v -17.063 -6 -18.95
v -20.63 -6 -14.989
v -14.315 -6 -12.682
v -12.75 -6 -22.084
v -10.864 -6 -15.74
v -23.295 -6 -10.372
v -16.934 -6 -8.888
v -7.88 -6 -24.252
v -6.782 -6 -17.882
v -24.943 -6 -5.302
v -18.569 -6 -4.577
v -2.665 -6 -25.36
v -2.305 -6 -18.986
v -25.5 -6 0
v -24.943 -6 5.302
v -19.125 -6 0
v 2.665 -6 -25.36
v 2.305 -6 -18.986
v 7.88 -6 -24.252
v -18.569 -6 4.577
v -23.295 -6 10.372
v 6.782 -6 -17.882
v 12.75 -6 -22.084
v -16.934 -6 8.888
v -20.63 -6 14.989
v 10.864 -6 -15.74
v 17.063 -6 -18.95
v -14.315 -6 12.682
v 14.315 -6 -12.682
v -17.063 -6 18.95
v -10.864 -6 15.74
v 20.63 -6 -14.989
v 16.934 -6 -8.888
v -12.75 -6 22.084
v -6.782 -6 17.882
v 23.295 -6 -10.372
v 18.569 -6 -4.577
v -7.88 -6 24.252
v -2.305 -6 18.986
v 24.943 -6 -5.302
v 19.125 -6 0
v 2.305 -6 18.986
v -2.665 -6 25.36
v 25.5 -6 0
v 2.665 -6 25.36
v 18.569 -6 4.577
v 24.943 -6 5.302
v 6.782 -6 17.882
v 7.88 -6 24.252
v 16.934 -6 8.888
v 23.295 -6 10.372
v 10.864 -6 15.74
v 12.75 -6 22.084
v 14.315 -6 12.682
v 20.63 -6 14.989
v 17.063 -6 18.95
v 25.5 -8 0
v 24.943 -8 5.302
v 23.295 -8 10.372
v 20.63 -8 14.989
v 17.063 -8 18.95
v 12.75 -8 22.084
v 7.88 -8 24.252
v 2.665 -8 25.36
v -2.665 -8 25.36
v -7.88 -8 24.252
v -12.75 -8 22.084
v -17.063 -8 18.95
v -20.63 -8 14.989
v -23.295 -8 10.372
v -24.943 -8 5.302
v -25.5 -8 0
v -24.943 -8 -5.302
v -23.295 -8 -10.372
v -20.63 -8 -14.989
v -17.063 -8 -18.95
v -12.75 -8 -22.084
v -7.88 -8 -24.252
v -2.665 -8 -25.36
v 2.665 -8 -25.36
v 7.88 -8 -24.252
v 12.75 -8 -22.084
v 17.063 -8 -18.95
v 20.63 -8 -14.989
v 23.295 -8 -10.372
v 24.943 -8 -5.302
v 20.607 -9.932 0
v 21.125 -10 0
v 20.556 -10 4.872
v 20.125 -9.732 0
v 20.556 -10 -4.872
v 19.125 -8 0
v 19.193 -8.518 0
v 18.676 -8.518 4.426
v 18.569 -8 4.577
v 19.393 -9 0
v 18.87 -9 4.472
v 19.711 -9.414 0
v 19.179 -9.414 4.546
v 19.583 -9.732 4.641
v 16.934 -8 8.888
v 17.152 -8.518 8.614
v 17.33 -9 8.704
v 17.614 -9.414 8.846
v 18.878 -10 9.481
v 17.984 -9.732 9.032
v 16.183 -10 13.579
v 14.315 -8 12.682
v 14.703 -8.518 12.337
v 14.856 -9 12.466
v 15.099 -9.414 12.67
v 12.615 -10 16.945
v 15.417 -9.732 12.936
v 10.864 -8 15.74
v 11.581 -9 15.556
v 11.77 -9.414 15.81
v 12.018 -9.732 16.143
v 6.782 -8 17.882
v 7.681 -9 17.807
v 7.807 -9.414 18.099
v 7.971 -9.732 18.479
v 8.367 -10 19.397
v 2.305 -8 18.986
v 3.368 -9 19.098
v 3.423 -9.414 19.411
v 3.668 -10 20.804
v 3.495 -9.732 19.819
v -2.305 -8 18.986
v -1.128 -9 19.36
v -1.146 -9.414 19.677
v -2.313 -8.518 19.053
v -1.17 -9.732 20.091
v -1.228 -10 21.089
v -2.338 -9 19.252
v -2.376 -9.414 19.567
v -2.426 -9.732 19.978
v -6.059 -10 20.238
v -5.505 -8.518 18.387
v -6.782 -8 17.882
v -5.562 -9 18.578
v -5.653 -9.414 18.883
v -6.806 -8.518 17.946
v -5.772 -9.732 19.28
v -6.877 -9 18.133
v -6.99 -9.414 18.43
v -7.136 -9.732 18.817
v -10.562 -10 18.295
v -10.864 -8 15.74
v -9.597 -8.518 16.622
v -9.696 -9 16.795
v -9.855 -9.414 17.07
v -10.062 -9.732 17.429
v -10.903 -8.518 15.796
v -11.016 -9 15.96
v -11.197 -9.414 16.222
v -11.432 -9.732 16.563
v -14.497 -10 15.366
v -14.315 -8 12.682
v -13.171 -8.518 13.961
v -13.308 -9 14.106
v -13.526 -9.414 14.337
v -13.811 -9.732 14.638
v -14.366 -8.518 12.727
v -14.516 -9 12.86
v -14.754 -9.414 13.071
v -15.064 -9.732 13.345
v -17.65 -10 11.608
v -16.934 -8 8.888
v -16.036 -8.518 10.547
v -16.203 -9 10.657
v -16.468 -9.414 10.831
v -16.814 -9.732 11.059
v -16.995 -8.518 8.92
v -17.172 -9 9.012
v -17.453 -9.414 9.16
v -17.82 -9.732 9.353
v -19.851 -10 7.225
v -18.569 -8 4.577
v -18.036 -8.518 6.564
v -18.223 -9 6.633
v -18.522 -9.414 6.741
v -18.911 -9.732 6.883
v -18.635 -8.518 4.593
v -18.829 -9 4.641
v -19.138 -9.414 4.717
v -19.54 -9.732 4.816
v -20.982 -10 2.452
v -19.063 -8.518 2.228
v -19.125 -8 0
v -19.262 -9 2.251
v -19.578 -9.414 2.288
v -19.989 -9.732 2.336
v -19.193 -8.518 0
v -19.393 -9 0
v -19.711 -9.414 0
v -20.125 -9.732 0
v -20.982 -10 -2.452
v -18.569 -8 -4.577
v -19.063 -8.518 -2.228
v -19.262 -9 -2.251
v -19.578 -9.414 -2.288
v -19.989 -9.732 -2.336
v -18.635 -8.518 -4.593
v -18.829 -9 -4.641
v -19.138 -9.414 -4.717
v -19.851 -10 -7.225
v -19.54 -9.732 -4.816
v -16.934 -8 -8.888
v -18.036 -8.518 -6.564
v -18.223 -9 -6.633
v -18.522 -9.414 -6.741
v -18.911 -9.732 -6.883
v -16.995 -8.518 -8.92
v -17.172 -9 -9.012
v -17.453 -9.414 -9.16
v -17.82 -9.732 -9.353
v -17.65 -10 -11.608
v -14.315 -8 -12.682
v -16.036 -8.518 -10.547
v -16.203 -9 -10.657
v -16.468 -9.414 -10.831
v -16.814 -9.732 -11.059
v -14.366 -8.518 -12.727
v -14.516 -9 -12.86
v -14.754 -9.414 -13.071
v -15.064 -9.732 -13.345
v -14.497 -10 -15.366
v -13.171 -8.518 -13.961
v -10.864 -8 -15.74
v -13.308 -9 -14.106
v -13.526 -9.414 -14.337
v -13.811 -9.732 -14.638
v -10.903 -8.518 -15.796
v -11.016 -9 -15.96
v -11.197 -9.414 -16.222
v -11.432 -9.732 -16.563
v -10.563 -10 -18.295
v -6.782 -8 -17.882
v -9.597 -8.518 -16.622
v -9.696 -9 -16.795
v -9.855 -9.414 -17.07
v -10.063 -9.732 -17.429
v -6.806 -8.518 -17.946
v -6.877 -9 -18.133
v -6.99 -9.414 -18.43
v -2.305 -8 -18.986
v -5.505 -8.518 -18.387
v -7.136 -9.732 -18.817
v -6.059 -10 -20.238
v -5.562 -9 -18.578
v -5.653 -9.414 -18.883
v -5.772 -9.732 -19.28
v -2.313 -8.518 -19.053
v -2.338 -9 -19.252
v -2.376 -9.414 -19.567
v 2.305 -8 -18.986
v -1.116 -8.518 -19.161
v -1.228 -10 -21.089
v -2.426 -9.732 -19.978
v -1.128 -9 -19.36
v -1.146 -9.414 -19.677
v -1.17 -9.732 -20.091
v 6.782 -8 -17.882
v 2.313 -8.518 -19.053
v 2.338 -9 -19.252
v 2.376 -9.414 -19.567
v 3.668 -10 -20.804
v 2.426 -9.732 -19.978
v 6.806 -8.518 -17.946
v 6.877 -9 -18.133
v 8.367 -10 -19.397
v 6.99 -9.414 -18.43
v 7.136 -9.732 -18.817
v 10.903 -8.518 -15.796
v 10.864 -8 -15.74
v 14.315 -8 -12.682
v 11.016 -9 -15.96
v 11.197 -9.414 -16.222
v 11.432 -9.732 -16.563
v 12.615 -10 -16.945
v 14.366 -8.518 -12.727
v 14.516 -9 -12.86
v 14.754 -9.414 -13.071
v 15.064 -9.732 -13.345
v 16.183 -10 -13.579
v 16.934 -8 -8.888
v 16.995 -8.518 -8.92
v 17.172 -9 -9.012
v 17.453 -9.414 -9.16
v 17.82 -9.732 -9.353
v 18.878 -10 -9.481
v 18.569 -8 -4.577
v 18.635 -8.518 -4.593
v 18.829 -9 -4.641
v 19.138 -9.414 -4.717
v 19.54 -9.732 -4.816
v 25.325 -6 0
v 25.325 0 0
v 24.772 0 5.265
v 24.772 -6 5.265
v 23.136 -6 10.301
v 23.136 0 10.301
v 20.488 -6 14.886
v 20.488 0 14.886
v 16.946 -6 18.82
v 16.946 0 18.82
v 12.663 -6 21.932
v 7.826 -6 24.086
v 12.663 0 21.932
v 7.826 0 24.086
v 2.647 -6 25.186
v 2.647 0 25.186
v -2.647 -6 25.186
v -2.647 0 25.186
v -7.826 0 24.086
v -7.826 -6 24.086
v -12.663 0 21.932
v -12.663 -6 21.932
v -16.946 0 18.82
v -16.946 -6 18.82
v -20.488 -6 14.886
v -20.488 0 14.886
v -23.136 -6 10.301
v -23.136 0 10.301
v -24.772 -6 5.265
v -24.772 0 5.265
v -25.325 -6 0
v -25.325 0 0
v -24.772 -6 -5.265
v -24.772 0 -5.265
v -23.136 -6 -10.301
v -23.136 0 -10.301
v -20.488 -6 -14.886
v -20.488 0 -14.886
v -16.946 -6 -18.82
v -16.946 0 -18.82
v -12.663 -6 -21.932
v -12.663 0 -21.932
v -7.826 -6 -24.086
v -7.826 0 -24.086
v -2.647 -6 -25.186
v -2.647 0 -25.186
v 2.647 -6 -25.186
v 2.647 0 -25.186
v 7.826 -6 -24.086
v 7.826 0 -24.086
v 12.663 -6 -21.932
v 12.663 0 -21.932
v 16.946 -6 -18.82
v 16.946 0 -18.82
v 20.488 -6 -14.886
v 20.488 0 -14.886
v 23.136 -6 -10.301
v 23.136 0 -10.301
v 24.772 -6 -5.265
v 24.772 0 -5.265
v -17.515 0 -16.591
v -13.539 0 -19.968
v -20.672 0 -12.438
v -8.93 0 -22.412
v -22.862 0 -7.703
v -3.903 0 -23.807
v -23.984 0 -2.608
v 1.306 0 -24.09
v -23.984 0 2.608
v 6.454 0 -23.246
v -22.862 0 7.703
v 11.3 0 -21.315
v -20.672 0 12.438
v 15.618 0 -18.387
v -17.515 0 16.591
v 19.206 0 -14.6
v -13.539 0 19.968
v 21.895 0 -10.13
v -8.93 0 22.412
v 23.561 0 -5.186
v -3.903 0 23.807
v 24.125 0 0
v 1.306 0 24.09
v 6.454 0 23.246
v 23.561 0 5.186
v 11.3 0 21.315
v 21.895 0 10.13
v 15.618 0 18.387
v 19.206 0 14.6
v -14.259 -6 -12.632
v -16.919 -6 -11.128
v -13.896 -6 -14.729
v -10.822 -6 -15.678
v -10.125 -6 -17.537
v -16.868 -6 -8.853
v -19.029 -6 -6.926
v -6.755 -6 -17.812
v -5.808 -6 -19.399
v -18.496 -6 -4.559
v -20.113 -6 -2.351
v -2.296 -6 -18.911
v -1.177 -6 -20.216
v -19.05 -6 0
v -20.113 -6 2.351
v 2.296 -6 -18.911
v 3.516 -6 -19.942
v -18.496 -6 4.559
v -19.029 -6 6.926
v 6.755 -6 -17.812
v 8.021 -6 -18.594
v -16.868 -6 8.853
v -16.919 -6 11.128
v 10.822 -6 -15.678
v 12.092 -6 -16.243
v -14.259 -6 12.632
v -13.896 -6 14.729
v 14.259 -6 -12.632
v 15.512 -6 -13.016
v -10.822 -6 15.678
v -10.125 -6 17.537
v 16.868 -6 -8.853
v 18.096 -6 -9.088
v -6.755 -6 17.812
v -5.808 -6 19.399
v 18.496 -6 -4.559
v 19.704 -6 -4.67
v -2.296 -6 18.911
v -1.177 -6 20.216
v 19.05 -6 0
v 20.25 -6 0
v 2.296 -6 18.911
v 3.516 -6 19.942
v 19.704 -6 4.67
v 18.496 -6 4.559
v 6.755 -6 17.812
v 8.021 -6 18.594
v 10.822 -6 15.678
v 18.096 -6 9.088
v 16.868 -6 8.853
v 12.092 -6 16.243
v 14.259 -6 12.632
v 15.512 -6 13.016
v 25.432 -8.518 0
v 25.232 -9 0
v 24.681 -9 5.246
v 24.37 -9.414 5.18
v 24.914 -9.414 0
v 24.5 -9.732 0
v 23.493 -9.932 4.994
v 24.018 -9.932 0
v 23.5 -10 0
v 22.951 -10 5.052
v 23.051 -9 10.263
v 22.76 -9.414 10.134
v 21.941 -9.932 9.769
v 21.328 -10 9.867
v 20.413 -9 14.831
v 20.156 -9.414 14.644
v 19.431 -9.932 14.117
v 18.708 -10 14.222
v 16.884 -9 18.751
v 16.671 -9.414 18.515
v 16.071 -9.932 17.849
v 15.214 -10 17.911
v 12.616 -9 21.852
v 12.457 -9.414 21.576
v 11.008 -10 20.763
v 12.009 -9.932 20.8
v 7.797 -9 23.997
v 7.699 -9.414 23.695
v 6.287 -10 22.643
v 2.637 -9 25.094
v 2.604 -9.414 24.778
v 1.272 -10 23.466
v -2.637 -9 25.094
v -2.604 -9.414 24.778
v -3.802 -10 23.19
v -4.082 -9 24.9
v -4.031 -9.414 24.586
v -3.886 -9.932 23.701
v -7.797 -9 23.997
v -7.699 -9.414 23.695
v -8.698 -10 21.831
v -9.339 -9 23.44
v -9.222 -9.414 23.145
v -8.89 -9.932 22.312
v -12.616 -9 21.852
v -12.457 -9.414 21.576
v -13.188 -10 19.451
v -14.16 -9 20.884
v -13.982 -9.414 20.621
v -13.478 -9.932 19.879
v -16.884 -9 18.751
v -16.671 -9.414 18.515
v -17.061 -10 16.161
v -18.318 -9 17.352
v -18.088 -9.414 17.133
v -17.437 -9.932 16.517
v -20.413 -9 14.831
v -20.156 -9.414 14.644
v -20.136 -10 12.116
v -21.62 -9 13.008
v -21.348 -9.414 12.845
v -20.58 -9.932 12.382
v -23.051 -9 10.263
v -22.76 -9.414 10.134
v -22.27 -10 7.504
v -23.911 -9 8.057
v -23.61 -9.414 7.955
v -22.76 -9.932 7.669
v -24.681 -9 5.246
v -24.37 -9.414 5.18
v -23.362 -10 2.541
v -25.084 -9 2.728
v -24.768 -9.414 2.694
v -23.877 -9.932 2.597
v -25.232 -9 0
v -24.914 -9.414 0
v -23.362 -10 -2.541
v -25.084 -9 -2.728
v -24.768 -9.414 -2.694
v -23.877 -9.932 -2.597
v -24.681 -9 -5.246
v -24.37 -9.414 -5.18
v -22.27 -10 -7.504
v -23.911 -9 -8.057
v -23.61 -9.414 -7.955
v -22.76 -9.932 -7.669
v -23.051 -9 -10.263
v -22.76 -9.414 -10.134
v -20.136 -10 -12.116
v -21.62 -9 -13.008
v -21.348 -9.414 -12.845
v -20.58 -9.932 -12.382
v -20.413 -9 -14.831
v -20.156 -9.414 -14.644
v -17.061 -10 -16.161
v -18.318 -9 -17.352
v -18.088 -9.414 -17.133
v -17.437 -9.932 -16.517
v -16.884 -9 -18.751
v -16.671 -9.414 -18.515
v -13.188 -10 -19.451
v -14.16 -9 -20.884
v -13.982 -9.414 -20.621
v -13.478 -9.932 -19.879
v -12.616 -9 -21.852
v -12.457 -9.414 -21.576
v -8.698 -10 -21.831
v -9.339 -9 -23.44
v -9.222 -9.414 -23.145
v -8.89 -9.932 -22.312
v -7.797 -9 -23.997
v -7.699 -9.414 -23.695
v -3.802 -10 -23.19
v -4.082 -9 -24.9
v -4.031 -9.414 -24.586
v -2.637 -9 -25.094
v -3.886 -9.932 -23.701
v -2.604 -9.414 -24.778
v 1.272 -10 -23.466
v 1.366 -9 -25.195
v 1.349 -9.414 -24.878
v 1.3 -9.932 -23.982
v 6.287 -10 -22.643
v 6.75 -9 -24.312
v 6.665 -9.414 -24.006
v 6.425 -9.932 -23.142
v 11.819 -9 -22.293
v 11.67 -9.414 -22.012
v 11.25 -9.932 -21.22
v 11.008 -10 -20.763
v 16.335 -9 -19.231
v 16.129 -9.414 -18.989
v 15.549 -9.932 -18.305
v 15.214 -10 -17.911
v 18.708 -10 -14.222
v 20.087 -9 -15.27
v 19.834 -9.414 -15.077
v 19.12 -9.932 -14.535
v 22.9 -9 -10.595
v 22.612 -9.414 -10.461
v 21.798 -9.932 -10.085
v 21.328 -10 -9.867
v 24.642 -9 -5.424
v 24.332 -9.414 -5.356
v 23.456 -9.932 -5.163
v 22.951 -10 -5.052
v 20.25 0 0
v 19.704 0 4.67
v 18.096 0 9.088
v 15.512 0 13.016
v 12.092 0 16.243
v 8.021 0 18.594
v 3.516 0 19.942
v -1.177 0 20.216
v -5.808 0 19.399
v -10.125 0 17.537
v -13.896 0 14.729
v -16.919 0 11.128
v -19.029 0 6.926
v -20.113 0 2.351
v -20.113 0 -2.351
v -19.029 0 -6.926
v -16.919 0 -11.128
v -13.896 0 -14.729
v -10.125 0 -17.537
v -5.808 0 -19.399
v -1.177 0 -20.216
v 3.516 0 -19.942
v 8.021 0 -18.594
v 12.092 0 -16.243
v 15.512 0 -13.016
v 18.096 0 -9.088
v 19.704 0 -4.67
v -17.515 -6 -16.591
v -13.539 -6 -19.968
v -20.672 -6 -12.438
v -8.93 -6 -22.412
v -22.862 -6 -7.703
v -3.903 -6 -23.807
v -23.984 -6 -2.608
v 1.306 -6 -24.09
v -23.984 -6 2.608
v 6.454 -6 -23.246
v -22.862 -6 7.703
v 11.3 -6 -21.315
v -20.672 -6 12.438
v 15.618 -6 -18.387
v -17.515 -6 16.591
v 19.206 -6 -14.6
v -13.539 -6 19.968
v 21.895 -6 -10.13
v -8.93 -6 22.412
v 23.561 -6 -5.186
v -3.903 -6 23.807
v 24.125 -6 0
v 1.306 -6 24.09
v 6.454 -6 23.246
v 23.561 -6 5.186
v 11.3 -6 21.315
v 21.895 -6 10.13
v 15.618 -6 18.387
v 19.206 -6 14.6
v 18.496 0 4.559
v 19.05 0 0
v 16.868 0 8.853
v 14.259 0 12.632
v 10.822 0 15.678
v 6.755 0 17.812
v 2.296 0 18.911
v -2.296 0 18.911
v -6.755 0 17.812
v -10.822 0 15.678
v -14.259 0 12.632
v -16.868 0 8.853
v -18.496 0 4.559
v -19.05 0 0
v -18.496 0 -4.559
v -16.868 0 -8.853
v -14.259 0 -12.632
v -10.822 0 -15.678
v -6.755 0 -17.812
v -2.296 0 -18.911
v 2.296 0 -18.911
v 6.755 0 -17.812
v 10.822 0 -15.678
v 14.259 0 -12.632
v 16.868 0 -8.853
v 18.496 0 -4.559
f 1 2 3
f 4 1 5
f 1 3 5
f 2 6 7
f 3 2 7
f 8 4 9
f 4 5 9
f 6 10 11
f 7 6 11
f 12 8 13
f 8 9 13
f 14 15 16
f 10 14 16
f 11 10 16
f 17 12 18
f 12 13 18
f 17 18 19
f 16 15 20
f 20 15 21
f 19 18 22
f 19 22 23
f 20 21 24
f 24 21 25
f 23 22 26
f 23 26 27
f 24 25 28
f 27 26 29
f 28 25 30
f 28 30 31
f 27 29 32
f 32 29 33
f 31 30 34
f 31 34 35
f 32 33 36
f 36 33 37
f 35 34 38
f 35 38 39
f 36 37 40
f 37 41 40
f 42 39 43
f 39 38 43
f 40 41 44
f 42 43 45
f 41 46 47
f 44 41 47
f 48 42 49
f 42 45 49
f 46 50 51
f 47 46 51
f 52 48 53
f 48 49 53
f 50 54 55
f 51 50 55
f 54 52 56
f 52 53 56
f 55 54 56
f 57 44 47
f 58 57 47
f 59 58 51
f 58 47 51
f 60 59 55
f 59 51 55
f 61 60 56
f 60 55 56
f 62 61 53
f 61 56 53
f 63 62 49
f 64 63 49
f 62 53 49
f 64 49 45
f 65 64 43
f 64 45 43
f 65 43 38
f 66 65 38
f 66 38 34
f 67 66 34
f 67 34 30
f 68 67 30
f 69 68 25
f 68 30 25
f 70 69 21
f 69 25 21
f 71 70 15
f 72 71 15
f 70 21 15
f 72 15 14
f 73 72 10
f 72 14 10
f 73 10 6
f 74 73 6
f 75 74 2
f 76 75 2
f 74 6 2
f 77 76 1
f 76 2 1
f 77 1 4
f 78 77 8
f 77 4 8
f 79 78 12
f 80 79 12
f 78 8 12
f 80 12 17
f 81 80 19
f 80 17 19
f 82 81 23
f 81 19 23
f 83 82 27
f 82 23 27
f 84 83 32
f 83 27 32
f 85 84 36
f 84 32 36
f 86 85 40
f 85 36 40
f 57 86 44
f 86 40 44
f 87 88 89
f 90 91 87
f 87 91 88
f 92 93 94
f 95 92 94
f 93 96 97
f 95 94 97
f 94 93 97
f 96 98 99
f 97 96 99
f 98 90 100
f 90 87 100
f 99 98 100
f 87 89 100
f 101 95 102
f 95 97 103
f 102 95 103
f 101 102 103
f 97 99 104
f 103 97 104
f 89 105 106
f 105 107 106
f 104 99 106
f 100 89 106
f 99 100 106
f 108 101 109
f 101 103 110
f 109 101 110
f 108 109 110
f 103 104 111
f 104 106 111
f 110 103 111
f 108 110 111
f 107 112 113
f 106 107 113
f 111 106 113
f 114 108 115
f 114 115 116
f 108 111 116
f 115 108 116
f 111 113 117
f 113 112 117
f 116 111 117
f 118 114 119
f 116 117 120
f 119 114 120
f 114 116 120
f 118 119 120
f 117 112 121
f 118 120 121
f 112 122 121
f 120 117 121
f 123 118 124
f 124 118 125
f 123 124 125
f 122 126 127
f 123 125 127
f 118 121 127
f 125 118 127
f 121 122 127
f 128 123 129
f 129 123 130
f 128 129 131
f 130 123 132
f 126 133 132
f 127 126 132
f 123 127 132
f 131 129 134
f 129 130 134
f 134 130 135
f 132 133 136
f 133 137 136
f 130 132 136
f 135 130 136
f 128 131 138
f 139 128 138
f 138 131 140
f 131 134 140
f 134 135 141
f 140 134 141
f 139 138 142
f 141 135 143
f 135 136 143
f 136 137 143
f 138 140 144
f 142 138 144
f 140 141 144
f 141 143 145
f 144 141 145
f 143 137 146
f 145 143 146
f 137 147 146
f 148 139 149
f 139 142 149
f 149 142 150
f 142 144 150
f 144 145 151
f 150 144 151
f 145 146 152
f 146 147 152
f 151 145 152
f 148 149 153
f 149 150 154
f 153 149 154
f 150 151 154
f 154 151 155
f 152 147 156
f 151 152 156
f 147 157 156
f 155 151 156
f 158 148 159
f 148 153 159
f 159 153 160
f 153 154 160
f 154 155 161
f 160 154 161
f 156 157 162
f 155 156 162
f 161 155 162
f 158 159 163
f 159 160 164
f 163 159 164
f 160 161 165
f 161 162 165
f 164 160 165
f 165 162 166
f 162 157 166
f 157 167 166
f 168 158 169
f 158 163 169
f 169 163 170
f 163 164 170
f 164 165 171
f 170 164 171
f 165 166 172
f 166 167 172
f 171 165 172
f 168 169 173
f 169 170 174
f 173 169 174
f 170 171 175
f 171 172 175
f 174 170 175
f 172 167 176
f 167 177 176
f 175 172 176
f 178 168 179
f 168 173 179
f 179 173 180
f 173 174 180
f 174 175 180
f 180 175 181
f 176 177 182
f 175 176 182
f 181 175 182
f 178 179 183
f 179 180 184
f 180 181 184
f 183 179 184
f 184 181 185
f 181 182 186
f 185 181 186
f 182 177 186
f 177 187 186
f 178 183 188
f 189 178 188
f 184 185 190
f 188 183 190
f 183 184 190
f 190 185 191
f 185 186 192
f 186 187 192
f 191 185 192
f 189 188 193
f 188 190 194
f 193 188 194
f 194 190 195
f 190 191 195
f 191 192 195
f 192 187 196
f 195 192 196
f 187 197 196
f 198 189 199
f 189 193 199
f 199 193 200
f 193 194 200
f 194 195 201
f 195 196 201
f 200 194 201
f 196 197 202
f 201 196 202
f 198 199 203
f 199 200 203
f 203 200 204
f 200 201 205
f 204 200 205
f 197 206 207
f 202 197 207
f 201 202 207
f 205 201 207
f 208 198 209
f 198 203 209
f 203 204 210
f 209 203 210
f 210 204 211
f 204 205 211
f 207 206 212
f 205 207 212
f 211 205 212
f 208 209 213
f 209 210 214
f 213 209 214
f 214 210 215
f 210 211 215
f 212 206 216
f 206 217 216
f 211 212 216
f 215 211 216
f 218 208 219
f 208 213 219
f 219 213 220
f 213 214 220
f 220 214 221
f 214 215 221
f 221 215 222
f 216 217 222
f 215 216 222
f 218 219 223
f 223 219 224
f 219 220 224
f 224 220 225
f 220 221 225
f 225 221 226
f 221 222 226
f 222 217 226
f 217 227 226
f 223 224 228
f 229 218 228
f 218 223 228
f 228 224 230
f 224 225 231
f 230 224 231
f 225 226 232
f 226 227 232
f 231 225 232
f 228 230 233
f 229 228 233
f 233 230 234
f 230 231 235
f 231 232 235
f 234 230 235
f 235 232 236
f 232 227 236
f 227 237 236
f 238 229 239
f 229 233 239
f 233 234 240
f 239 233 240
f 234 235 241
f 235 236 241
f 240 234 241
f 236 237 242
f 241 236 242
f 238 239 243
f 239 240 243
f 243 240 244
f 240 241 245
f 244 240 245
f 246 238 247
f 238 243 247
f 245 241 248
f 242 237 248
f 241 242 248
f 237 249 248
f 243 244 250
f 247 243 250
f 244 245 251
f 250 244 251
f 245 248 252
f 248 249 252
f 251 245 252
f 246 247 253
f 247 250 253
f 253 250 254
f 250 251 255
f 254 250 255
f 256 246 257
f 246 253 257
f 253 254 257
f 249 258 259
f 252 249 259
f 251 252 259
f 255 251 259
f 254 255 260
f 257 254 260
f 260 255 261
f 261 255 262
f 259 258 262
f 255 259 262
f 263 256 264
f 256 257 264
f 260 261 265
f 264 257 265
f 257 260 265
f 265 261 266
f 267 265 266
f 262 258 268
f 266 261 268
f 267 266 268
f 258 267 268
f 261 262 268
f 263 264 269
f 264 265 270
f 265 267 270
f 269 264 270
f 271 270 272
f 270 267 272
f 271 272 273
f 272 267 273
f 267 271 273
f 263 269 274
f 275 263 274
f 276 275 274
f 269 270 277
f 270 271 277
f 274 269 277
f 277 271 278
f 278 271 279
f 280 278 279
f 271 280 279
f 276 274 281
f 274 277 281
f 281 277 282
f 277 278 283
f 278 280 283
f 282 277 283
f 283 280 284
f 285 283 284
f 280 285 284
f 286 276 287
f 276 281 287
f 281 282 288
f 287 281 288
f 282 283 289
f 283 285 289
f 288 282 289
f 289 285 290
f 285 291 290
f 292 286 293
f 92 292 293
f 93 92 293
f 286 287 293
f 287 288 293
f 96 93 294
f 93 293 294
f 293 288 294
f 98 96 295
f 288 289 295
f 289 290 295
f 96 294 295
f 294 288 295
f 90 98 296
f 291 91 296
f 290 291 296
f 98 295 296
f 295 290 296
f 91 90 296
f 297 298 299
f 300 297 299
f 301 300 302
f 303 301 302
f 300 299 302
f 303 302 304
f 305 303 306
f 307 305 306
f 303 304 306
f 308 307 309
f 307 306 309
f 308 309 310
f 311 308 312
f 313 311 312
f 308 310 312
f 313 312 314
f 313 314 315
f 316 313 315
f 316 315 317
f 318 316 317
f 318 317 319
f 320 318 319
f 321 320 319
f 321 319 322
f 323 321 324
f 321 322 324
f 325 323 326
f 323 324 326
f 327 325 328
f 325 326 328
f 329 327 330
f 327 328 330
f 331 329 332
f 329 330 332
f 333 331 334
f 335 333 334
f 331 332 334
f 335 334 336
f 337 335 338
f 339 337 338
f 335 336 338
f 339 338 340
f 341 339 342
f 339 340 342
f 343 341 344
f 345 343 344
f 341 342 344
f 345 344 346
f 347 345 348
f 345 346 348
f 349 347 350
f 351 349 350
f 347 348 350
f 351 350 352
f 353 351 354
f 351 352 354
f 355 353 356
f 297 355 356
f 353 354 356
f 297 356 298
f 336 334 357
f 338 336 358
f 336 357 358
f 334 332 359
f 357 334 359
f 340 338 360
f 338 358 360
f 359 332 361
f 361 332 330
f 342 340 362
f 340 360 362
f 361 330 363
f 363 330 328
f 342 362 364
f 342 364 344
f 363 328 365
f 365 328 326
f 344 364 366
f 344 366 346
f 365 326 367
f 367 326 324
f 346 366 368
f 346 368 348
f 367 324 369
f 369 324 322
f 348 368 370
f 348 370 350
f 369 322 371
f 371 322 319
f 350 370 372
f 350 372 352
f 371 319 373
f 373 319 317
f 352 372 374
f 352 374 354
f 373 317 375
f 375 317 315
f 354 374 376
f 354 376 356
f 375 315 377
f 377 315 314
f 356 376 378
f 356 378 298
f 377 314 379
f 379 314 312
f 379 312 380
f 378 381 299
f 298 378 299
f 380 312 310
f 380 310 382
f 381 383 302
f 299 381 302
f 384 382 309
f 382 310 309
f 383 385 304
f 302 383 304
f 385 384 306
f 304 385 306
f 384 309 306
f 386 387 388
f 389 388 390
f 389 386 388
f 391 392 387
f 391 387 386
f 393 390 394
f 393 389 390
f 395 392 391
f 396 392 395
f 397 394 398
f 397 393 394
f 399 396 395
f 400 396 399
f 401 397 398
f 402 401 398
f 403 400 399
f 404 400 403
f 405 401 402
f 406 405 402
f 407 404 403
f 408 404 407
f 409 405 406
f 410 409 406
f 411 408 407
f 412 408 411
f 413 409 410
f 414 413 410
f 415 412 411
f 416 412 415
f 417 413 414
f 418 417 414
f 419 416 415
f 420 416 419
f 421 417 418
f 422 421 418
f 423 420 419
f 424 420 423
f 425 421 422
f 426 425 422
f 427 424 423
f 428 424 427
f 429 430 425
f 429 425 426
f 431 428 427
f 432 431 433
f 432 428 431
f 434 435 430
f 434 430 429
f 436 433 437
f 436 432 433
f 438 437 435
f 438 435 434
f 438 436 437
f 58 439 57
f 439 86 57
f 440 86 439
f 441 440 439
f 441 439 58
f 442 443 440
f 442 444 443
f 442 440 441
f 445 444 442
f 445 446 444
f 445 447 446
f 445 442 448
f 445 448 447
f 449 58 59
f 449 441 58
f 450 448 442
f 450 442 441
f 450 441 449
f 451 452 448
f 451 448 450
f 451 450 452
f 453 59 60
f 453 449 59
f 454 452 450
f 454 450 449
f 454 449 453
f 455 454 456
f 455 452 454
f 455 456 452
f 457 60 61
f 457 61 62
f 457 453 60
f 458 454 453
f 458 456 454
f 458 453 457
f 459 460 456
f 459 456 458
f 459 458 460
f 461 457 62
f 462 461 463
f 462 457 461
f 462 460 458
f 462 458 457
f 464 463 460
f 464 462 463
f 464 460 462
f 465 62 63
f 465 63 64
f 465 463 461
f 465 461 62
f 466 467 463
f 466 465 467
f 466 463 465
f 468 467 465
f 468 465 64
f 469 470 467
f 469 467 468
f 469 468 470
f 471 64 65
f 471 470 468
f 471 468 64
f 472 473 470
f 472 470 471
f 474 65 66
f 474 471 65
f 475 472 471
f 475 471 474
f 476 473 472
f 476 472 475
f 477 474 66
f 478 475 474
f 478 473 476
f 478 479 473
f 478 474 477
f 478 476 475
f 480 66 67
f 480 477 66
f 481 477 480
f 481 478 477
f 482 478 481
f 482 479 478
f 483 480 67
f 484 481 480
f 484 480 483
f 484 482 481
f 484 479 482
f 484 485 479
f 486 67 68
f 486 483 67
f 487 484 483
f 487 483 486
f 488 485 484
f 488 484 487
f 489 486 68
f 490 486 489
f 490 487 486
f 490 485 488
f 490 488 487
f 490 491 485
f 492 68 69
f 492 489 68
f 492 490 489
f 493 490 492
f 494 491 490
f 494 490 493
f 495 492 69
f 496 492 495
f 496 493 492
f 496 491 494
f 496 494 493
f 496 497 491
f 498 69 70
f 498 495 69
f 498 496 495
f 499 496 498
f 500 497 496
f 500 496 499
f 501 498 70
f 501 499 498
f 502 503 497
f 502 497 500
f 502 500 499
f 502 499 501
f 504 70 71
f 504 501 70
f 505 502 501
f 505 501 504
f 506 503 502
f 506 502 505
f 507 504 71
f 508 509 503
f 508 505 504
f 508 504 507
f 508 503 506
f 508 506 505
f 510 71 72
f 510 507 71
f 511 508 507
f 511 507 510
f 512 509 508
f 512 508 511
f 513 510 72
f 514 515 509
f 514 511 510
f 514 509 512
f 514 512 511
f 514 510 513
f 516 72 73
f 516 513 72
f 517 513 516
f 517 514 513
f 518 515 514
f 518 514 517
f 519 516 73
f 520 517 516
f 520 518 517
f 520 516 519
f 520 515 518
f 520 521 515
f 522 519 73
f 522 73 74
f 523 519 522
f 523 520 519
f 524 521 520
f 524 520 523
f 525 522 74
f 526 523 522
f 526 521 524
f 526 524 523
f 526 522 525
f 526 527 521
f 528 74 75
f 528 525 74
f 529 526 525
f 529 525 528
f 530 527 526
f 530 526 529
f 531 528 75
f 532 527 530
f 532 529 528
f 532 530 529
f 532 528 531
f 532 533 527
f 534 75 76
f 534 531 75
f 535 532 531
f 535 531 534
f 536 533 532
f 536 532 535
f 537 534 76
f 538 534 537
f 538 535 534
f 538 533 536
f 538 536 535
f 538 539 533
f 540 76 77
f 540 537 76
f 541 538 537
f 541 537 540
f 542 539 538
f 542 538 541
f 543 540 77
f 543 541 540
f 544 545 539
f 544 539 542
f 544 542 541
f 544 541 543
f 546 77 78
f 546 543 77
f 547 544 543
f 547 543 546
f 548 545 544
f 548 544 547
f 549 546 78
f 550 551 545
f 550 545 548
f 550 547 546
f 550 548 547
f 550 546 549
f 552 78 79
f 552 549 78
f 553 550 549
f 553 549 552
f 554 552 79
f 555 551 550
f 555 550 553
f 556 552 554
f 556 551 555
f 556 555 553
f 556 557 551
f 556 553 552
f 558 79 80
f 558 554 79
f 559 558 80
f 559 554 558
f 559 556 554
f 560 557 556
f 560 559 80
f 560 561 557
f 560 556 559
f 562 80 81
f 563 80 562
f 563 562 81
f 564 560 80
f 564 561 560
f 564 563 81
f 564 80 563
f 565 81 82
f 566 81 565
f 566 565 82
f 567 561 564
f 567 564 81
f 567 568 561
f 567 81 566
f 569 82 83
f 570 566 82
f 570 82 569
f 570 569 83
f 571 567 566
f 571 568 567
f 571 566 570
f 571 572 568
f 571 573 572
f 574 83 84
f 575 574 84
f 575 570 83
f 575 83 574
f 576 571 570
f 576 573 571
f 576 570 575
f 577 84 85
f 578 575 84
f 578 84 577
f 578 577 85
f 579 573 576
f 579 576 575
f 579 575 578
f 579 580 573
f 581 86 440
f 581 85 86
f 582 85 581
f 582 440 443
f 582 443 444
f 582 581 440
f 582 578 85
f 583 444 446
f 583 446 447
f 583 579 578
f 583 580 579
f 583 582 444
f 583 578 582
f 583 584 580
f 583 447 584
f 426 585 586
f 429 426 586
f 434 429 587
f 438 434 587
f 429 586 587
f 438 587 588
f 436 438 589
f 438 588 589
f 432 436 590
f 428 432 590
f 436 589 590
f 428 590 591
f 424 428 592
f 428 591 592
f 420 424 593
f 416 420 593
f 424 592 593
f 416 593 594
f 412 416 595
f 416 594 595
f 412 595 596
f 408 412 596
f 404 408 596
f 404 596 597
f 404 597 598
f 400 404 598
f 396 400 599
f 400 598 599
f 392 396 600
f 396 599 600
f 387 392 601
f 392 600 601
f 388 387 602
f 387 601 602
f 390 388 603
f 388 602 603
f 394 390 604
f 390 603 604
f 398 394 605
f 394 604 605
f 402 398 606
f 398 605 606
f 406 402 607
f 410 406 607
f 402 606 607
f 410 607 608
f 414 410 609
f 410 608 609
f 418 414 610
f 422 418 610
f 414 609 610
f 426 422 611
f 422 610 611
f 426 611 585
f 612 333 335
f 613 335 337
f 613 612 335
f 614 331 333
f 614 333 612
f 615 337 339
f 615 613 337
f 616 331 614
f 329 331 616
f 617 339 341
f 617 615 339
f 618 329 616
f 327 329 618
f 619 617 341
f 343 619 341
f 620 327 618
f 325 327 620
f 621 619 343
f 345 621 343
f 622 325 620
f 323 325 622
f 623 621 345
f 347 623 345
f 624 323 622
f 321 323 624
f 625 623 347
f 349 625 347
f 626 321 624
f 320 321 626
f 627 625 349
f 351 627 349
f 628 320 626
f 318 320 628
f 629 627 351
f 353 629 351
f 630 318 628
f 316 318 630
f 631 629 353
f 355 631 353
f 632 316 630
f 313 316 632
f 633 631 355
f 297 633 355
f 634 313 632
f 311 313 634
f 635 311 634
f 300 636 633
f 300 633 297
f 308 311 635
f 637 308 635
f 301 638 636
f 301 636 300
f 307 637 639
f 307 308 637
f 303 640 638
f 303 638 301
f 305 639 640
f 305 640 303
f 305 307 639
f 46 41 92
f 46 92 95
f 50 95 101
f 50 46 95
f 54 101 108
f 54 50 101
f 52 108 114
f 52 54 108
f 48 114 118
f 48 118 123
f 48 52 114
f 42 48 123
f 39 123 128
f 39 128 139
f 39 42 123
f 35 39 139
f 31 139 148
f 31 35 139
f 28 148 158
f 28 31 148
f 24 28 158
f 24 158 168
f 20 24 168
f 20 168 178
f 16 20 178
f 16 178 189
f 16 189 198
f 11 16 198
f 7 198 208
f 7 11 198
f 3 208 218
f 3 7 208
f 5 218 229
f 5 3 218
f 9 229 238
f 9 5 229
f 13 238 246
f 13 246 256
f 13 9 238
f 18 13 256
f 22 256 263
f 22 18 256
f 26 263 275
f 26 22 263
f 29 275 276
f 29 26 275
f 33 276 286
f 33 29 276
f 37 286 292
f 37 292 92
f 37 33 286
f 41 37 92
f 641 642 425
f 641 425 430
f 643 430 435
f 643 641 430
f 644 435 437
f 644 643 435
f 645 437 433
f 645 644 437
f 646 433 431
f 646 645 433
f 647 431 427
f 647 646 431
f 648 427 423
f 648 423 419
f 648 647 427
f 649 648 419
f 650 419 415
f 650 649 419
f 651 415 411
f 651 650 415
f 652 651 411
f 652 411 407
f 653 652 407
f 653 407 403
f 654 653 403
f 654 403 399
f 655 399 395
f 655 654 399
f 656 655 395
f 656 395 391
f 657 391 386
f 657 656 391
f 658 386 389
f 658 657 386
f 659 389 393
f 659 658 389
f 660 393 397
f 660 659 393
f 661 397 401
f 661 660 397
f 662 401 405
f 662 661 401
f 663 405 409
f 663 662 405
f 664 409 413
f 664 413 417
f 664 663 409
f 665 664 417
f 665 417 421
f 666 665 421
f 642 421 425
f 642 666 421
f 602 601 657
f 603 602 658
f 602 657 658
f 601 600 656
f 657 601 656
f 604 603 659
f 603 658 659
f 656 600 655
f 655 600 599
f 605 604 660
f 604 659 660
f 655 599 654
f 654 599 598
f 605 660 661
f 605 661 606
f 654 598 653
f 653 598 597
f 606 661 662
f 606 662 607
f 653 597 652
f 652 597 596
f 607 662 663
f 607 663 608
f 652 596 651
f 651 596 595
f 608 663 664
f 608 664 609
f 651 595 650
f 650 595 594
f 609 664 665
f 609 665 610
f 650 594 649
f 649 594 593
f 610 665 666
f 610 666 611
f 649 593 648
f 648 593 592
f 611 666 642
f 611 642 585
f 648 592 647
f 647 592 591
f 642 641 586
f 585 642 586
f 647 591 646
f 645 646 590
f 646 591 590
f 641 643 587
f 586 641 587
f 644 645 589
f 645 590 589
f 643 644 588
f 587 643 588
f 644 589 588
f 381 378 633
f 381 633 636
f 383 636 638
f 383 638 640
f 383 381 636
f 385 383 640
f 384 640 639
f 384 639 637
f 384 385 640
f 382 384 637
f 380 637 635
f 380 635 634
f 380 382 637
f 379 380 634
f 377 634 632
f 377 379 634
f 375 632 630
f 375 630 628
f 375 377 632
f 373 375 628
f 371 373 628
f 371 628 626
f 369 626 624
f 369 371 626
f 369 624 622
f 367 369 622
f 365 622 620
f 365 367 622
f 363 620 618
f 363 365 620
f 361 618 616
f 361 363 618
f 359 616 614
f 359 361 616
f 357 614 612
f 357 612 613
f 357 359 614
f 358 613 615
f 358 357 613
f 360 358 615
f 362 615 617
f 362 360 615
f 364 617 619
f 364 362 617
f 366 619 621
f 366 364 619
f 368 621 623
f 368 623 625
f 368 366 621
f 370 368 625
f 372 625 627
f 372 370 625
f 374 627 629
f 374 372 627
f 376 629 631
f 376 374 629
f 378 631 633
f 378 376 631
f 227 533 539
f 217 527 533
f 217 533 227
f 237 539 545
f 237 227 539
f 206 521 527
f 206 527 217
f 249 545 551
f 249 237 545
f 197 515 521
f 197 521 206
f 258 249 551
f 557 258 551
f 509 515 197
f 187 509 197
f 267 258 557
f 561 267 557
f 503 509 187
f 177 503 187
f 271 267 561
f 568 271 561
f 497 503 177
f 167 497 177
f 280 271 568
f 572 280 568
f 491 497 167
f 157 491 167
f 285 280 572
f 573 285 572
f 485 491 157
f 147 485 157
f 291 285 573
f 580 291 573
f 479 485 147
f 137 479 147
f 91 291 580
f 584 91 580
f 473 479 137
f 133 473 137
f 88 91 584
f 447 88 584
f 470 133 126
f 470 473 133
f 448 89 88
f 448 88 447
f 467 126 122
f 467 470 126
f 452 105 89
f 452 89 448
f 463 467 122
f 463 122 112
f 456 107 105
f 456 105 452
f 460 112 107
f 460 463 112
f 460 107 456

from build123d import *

# Parameters (mm, degrees)
F0_R     = 25.325
F0_R_2   = 24.125
F0_R_3   = 20.25
F0_R_4   = 19.05
F1_DEPTH = 6
F3_R     = 25.5
F3_R_2   = 19.125
F4_DEPTH = 4
F5_R     = 2


with BuildPart() as f1:
    # F0 (on Front) → F1 (new body)
    with BuildSketch(Plane.XZ):
        Circle(F0_R)
        Circle(F0_R_2, mode=Mode.SUBTRACT)
        Circle(F0_R_3)
        Circle(F0_R_4, mode=Mode.SUBTRACT)
    extrude(amount=F1_DEPTH)


with BuildPart() as f4:
    # F3 (on offset) → F4 (new body)
    with BuildSketch(Plane.XZ.offset(6)):
        Circle(F3_R)
        Circle(F3_R_2, mode=Mode.SUBTRACT)
    extrude(amount=F4_DEPTH)

    # F5
    f5_edges = [f4.edges().sort_by_distance(p)[0] for p in [
        (-25.5, -10, 0),
        (-19.125, -10, 0),
    ]]
    fillet(f5_edges, radius=F5_R)


solid = Compound([f1.part, f4.part])
